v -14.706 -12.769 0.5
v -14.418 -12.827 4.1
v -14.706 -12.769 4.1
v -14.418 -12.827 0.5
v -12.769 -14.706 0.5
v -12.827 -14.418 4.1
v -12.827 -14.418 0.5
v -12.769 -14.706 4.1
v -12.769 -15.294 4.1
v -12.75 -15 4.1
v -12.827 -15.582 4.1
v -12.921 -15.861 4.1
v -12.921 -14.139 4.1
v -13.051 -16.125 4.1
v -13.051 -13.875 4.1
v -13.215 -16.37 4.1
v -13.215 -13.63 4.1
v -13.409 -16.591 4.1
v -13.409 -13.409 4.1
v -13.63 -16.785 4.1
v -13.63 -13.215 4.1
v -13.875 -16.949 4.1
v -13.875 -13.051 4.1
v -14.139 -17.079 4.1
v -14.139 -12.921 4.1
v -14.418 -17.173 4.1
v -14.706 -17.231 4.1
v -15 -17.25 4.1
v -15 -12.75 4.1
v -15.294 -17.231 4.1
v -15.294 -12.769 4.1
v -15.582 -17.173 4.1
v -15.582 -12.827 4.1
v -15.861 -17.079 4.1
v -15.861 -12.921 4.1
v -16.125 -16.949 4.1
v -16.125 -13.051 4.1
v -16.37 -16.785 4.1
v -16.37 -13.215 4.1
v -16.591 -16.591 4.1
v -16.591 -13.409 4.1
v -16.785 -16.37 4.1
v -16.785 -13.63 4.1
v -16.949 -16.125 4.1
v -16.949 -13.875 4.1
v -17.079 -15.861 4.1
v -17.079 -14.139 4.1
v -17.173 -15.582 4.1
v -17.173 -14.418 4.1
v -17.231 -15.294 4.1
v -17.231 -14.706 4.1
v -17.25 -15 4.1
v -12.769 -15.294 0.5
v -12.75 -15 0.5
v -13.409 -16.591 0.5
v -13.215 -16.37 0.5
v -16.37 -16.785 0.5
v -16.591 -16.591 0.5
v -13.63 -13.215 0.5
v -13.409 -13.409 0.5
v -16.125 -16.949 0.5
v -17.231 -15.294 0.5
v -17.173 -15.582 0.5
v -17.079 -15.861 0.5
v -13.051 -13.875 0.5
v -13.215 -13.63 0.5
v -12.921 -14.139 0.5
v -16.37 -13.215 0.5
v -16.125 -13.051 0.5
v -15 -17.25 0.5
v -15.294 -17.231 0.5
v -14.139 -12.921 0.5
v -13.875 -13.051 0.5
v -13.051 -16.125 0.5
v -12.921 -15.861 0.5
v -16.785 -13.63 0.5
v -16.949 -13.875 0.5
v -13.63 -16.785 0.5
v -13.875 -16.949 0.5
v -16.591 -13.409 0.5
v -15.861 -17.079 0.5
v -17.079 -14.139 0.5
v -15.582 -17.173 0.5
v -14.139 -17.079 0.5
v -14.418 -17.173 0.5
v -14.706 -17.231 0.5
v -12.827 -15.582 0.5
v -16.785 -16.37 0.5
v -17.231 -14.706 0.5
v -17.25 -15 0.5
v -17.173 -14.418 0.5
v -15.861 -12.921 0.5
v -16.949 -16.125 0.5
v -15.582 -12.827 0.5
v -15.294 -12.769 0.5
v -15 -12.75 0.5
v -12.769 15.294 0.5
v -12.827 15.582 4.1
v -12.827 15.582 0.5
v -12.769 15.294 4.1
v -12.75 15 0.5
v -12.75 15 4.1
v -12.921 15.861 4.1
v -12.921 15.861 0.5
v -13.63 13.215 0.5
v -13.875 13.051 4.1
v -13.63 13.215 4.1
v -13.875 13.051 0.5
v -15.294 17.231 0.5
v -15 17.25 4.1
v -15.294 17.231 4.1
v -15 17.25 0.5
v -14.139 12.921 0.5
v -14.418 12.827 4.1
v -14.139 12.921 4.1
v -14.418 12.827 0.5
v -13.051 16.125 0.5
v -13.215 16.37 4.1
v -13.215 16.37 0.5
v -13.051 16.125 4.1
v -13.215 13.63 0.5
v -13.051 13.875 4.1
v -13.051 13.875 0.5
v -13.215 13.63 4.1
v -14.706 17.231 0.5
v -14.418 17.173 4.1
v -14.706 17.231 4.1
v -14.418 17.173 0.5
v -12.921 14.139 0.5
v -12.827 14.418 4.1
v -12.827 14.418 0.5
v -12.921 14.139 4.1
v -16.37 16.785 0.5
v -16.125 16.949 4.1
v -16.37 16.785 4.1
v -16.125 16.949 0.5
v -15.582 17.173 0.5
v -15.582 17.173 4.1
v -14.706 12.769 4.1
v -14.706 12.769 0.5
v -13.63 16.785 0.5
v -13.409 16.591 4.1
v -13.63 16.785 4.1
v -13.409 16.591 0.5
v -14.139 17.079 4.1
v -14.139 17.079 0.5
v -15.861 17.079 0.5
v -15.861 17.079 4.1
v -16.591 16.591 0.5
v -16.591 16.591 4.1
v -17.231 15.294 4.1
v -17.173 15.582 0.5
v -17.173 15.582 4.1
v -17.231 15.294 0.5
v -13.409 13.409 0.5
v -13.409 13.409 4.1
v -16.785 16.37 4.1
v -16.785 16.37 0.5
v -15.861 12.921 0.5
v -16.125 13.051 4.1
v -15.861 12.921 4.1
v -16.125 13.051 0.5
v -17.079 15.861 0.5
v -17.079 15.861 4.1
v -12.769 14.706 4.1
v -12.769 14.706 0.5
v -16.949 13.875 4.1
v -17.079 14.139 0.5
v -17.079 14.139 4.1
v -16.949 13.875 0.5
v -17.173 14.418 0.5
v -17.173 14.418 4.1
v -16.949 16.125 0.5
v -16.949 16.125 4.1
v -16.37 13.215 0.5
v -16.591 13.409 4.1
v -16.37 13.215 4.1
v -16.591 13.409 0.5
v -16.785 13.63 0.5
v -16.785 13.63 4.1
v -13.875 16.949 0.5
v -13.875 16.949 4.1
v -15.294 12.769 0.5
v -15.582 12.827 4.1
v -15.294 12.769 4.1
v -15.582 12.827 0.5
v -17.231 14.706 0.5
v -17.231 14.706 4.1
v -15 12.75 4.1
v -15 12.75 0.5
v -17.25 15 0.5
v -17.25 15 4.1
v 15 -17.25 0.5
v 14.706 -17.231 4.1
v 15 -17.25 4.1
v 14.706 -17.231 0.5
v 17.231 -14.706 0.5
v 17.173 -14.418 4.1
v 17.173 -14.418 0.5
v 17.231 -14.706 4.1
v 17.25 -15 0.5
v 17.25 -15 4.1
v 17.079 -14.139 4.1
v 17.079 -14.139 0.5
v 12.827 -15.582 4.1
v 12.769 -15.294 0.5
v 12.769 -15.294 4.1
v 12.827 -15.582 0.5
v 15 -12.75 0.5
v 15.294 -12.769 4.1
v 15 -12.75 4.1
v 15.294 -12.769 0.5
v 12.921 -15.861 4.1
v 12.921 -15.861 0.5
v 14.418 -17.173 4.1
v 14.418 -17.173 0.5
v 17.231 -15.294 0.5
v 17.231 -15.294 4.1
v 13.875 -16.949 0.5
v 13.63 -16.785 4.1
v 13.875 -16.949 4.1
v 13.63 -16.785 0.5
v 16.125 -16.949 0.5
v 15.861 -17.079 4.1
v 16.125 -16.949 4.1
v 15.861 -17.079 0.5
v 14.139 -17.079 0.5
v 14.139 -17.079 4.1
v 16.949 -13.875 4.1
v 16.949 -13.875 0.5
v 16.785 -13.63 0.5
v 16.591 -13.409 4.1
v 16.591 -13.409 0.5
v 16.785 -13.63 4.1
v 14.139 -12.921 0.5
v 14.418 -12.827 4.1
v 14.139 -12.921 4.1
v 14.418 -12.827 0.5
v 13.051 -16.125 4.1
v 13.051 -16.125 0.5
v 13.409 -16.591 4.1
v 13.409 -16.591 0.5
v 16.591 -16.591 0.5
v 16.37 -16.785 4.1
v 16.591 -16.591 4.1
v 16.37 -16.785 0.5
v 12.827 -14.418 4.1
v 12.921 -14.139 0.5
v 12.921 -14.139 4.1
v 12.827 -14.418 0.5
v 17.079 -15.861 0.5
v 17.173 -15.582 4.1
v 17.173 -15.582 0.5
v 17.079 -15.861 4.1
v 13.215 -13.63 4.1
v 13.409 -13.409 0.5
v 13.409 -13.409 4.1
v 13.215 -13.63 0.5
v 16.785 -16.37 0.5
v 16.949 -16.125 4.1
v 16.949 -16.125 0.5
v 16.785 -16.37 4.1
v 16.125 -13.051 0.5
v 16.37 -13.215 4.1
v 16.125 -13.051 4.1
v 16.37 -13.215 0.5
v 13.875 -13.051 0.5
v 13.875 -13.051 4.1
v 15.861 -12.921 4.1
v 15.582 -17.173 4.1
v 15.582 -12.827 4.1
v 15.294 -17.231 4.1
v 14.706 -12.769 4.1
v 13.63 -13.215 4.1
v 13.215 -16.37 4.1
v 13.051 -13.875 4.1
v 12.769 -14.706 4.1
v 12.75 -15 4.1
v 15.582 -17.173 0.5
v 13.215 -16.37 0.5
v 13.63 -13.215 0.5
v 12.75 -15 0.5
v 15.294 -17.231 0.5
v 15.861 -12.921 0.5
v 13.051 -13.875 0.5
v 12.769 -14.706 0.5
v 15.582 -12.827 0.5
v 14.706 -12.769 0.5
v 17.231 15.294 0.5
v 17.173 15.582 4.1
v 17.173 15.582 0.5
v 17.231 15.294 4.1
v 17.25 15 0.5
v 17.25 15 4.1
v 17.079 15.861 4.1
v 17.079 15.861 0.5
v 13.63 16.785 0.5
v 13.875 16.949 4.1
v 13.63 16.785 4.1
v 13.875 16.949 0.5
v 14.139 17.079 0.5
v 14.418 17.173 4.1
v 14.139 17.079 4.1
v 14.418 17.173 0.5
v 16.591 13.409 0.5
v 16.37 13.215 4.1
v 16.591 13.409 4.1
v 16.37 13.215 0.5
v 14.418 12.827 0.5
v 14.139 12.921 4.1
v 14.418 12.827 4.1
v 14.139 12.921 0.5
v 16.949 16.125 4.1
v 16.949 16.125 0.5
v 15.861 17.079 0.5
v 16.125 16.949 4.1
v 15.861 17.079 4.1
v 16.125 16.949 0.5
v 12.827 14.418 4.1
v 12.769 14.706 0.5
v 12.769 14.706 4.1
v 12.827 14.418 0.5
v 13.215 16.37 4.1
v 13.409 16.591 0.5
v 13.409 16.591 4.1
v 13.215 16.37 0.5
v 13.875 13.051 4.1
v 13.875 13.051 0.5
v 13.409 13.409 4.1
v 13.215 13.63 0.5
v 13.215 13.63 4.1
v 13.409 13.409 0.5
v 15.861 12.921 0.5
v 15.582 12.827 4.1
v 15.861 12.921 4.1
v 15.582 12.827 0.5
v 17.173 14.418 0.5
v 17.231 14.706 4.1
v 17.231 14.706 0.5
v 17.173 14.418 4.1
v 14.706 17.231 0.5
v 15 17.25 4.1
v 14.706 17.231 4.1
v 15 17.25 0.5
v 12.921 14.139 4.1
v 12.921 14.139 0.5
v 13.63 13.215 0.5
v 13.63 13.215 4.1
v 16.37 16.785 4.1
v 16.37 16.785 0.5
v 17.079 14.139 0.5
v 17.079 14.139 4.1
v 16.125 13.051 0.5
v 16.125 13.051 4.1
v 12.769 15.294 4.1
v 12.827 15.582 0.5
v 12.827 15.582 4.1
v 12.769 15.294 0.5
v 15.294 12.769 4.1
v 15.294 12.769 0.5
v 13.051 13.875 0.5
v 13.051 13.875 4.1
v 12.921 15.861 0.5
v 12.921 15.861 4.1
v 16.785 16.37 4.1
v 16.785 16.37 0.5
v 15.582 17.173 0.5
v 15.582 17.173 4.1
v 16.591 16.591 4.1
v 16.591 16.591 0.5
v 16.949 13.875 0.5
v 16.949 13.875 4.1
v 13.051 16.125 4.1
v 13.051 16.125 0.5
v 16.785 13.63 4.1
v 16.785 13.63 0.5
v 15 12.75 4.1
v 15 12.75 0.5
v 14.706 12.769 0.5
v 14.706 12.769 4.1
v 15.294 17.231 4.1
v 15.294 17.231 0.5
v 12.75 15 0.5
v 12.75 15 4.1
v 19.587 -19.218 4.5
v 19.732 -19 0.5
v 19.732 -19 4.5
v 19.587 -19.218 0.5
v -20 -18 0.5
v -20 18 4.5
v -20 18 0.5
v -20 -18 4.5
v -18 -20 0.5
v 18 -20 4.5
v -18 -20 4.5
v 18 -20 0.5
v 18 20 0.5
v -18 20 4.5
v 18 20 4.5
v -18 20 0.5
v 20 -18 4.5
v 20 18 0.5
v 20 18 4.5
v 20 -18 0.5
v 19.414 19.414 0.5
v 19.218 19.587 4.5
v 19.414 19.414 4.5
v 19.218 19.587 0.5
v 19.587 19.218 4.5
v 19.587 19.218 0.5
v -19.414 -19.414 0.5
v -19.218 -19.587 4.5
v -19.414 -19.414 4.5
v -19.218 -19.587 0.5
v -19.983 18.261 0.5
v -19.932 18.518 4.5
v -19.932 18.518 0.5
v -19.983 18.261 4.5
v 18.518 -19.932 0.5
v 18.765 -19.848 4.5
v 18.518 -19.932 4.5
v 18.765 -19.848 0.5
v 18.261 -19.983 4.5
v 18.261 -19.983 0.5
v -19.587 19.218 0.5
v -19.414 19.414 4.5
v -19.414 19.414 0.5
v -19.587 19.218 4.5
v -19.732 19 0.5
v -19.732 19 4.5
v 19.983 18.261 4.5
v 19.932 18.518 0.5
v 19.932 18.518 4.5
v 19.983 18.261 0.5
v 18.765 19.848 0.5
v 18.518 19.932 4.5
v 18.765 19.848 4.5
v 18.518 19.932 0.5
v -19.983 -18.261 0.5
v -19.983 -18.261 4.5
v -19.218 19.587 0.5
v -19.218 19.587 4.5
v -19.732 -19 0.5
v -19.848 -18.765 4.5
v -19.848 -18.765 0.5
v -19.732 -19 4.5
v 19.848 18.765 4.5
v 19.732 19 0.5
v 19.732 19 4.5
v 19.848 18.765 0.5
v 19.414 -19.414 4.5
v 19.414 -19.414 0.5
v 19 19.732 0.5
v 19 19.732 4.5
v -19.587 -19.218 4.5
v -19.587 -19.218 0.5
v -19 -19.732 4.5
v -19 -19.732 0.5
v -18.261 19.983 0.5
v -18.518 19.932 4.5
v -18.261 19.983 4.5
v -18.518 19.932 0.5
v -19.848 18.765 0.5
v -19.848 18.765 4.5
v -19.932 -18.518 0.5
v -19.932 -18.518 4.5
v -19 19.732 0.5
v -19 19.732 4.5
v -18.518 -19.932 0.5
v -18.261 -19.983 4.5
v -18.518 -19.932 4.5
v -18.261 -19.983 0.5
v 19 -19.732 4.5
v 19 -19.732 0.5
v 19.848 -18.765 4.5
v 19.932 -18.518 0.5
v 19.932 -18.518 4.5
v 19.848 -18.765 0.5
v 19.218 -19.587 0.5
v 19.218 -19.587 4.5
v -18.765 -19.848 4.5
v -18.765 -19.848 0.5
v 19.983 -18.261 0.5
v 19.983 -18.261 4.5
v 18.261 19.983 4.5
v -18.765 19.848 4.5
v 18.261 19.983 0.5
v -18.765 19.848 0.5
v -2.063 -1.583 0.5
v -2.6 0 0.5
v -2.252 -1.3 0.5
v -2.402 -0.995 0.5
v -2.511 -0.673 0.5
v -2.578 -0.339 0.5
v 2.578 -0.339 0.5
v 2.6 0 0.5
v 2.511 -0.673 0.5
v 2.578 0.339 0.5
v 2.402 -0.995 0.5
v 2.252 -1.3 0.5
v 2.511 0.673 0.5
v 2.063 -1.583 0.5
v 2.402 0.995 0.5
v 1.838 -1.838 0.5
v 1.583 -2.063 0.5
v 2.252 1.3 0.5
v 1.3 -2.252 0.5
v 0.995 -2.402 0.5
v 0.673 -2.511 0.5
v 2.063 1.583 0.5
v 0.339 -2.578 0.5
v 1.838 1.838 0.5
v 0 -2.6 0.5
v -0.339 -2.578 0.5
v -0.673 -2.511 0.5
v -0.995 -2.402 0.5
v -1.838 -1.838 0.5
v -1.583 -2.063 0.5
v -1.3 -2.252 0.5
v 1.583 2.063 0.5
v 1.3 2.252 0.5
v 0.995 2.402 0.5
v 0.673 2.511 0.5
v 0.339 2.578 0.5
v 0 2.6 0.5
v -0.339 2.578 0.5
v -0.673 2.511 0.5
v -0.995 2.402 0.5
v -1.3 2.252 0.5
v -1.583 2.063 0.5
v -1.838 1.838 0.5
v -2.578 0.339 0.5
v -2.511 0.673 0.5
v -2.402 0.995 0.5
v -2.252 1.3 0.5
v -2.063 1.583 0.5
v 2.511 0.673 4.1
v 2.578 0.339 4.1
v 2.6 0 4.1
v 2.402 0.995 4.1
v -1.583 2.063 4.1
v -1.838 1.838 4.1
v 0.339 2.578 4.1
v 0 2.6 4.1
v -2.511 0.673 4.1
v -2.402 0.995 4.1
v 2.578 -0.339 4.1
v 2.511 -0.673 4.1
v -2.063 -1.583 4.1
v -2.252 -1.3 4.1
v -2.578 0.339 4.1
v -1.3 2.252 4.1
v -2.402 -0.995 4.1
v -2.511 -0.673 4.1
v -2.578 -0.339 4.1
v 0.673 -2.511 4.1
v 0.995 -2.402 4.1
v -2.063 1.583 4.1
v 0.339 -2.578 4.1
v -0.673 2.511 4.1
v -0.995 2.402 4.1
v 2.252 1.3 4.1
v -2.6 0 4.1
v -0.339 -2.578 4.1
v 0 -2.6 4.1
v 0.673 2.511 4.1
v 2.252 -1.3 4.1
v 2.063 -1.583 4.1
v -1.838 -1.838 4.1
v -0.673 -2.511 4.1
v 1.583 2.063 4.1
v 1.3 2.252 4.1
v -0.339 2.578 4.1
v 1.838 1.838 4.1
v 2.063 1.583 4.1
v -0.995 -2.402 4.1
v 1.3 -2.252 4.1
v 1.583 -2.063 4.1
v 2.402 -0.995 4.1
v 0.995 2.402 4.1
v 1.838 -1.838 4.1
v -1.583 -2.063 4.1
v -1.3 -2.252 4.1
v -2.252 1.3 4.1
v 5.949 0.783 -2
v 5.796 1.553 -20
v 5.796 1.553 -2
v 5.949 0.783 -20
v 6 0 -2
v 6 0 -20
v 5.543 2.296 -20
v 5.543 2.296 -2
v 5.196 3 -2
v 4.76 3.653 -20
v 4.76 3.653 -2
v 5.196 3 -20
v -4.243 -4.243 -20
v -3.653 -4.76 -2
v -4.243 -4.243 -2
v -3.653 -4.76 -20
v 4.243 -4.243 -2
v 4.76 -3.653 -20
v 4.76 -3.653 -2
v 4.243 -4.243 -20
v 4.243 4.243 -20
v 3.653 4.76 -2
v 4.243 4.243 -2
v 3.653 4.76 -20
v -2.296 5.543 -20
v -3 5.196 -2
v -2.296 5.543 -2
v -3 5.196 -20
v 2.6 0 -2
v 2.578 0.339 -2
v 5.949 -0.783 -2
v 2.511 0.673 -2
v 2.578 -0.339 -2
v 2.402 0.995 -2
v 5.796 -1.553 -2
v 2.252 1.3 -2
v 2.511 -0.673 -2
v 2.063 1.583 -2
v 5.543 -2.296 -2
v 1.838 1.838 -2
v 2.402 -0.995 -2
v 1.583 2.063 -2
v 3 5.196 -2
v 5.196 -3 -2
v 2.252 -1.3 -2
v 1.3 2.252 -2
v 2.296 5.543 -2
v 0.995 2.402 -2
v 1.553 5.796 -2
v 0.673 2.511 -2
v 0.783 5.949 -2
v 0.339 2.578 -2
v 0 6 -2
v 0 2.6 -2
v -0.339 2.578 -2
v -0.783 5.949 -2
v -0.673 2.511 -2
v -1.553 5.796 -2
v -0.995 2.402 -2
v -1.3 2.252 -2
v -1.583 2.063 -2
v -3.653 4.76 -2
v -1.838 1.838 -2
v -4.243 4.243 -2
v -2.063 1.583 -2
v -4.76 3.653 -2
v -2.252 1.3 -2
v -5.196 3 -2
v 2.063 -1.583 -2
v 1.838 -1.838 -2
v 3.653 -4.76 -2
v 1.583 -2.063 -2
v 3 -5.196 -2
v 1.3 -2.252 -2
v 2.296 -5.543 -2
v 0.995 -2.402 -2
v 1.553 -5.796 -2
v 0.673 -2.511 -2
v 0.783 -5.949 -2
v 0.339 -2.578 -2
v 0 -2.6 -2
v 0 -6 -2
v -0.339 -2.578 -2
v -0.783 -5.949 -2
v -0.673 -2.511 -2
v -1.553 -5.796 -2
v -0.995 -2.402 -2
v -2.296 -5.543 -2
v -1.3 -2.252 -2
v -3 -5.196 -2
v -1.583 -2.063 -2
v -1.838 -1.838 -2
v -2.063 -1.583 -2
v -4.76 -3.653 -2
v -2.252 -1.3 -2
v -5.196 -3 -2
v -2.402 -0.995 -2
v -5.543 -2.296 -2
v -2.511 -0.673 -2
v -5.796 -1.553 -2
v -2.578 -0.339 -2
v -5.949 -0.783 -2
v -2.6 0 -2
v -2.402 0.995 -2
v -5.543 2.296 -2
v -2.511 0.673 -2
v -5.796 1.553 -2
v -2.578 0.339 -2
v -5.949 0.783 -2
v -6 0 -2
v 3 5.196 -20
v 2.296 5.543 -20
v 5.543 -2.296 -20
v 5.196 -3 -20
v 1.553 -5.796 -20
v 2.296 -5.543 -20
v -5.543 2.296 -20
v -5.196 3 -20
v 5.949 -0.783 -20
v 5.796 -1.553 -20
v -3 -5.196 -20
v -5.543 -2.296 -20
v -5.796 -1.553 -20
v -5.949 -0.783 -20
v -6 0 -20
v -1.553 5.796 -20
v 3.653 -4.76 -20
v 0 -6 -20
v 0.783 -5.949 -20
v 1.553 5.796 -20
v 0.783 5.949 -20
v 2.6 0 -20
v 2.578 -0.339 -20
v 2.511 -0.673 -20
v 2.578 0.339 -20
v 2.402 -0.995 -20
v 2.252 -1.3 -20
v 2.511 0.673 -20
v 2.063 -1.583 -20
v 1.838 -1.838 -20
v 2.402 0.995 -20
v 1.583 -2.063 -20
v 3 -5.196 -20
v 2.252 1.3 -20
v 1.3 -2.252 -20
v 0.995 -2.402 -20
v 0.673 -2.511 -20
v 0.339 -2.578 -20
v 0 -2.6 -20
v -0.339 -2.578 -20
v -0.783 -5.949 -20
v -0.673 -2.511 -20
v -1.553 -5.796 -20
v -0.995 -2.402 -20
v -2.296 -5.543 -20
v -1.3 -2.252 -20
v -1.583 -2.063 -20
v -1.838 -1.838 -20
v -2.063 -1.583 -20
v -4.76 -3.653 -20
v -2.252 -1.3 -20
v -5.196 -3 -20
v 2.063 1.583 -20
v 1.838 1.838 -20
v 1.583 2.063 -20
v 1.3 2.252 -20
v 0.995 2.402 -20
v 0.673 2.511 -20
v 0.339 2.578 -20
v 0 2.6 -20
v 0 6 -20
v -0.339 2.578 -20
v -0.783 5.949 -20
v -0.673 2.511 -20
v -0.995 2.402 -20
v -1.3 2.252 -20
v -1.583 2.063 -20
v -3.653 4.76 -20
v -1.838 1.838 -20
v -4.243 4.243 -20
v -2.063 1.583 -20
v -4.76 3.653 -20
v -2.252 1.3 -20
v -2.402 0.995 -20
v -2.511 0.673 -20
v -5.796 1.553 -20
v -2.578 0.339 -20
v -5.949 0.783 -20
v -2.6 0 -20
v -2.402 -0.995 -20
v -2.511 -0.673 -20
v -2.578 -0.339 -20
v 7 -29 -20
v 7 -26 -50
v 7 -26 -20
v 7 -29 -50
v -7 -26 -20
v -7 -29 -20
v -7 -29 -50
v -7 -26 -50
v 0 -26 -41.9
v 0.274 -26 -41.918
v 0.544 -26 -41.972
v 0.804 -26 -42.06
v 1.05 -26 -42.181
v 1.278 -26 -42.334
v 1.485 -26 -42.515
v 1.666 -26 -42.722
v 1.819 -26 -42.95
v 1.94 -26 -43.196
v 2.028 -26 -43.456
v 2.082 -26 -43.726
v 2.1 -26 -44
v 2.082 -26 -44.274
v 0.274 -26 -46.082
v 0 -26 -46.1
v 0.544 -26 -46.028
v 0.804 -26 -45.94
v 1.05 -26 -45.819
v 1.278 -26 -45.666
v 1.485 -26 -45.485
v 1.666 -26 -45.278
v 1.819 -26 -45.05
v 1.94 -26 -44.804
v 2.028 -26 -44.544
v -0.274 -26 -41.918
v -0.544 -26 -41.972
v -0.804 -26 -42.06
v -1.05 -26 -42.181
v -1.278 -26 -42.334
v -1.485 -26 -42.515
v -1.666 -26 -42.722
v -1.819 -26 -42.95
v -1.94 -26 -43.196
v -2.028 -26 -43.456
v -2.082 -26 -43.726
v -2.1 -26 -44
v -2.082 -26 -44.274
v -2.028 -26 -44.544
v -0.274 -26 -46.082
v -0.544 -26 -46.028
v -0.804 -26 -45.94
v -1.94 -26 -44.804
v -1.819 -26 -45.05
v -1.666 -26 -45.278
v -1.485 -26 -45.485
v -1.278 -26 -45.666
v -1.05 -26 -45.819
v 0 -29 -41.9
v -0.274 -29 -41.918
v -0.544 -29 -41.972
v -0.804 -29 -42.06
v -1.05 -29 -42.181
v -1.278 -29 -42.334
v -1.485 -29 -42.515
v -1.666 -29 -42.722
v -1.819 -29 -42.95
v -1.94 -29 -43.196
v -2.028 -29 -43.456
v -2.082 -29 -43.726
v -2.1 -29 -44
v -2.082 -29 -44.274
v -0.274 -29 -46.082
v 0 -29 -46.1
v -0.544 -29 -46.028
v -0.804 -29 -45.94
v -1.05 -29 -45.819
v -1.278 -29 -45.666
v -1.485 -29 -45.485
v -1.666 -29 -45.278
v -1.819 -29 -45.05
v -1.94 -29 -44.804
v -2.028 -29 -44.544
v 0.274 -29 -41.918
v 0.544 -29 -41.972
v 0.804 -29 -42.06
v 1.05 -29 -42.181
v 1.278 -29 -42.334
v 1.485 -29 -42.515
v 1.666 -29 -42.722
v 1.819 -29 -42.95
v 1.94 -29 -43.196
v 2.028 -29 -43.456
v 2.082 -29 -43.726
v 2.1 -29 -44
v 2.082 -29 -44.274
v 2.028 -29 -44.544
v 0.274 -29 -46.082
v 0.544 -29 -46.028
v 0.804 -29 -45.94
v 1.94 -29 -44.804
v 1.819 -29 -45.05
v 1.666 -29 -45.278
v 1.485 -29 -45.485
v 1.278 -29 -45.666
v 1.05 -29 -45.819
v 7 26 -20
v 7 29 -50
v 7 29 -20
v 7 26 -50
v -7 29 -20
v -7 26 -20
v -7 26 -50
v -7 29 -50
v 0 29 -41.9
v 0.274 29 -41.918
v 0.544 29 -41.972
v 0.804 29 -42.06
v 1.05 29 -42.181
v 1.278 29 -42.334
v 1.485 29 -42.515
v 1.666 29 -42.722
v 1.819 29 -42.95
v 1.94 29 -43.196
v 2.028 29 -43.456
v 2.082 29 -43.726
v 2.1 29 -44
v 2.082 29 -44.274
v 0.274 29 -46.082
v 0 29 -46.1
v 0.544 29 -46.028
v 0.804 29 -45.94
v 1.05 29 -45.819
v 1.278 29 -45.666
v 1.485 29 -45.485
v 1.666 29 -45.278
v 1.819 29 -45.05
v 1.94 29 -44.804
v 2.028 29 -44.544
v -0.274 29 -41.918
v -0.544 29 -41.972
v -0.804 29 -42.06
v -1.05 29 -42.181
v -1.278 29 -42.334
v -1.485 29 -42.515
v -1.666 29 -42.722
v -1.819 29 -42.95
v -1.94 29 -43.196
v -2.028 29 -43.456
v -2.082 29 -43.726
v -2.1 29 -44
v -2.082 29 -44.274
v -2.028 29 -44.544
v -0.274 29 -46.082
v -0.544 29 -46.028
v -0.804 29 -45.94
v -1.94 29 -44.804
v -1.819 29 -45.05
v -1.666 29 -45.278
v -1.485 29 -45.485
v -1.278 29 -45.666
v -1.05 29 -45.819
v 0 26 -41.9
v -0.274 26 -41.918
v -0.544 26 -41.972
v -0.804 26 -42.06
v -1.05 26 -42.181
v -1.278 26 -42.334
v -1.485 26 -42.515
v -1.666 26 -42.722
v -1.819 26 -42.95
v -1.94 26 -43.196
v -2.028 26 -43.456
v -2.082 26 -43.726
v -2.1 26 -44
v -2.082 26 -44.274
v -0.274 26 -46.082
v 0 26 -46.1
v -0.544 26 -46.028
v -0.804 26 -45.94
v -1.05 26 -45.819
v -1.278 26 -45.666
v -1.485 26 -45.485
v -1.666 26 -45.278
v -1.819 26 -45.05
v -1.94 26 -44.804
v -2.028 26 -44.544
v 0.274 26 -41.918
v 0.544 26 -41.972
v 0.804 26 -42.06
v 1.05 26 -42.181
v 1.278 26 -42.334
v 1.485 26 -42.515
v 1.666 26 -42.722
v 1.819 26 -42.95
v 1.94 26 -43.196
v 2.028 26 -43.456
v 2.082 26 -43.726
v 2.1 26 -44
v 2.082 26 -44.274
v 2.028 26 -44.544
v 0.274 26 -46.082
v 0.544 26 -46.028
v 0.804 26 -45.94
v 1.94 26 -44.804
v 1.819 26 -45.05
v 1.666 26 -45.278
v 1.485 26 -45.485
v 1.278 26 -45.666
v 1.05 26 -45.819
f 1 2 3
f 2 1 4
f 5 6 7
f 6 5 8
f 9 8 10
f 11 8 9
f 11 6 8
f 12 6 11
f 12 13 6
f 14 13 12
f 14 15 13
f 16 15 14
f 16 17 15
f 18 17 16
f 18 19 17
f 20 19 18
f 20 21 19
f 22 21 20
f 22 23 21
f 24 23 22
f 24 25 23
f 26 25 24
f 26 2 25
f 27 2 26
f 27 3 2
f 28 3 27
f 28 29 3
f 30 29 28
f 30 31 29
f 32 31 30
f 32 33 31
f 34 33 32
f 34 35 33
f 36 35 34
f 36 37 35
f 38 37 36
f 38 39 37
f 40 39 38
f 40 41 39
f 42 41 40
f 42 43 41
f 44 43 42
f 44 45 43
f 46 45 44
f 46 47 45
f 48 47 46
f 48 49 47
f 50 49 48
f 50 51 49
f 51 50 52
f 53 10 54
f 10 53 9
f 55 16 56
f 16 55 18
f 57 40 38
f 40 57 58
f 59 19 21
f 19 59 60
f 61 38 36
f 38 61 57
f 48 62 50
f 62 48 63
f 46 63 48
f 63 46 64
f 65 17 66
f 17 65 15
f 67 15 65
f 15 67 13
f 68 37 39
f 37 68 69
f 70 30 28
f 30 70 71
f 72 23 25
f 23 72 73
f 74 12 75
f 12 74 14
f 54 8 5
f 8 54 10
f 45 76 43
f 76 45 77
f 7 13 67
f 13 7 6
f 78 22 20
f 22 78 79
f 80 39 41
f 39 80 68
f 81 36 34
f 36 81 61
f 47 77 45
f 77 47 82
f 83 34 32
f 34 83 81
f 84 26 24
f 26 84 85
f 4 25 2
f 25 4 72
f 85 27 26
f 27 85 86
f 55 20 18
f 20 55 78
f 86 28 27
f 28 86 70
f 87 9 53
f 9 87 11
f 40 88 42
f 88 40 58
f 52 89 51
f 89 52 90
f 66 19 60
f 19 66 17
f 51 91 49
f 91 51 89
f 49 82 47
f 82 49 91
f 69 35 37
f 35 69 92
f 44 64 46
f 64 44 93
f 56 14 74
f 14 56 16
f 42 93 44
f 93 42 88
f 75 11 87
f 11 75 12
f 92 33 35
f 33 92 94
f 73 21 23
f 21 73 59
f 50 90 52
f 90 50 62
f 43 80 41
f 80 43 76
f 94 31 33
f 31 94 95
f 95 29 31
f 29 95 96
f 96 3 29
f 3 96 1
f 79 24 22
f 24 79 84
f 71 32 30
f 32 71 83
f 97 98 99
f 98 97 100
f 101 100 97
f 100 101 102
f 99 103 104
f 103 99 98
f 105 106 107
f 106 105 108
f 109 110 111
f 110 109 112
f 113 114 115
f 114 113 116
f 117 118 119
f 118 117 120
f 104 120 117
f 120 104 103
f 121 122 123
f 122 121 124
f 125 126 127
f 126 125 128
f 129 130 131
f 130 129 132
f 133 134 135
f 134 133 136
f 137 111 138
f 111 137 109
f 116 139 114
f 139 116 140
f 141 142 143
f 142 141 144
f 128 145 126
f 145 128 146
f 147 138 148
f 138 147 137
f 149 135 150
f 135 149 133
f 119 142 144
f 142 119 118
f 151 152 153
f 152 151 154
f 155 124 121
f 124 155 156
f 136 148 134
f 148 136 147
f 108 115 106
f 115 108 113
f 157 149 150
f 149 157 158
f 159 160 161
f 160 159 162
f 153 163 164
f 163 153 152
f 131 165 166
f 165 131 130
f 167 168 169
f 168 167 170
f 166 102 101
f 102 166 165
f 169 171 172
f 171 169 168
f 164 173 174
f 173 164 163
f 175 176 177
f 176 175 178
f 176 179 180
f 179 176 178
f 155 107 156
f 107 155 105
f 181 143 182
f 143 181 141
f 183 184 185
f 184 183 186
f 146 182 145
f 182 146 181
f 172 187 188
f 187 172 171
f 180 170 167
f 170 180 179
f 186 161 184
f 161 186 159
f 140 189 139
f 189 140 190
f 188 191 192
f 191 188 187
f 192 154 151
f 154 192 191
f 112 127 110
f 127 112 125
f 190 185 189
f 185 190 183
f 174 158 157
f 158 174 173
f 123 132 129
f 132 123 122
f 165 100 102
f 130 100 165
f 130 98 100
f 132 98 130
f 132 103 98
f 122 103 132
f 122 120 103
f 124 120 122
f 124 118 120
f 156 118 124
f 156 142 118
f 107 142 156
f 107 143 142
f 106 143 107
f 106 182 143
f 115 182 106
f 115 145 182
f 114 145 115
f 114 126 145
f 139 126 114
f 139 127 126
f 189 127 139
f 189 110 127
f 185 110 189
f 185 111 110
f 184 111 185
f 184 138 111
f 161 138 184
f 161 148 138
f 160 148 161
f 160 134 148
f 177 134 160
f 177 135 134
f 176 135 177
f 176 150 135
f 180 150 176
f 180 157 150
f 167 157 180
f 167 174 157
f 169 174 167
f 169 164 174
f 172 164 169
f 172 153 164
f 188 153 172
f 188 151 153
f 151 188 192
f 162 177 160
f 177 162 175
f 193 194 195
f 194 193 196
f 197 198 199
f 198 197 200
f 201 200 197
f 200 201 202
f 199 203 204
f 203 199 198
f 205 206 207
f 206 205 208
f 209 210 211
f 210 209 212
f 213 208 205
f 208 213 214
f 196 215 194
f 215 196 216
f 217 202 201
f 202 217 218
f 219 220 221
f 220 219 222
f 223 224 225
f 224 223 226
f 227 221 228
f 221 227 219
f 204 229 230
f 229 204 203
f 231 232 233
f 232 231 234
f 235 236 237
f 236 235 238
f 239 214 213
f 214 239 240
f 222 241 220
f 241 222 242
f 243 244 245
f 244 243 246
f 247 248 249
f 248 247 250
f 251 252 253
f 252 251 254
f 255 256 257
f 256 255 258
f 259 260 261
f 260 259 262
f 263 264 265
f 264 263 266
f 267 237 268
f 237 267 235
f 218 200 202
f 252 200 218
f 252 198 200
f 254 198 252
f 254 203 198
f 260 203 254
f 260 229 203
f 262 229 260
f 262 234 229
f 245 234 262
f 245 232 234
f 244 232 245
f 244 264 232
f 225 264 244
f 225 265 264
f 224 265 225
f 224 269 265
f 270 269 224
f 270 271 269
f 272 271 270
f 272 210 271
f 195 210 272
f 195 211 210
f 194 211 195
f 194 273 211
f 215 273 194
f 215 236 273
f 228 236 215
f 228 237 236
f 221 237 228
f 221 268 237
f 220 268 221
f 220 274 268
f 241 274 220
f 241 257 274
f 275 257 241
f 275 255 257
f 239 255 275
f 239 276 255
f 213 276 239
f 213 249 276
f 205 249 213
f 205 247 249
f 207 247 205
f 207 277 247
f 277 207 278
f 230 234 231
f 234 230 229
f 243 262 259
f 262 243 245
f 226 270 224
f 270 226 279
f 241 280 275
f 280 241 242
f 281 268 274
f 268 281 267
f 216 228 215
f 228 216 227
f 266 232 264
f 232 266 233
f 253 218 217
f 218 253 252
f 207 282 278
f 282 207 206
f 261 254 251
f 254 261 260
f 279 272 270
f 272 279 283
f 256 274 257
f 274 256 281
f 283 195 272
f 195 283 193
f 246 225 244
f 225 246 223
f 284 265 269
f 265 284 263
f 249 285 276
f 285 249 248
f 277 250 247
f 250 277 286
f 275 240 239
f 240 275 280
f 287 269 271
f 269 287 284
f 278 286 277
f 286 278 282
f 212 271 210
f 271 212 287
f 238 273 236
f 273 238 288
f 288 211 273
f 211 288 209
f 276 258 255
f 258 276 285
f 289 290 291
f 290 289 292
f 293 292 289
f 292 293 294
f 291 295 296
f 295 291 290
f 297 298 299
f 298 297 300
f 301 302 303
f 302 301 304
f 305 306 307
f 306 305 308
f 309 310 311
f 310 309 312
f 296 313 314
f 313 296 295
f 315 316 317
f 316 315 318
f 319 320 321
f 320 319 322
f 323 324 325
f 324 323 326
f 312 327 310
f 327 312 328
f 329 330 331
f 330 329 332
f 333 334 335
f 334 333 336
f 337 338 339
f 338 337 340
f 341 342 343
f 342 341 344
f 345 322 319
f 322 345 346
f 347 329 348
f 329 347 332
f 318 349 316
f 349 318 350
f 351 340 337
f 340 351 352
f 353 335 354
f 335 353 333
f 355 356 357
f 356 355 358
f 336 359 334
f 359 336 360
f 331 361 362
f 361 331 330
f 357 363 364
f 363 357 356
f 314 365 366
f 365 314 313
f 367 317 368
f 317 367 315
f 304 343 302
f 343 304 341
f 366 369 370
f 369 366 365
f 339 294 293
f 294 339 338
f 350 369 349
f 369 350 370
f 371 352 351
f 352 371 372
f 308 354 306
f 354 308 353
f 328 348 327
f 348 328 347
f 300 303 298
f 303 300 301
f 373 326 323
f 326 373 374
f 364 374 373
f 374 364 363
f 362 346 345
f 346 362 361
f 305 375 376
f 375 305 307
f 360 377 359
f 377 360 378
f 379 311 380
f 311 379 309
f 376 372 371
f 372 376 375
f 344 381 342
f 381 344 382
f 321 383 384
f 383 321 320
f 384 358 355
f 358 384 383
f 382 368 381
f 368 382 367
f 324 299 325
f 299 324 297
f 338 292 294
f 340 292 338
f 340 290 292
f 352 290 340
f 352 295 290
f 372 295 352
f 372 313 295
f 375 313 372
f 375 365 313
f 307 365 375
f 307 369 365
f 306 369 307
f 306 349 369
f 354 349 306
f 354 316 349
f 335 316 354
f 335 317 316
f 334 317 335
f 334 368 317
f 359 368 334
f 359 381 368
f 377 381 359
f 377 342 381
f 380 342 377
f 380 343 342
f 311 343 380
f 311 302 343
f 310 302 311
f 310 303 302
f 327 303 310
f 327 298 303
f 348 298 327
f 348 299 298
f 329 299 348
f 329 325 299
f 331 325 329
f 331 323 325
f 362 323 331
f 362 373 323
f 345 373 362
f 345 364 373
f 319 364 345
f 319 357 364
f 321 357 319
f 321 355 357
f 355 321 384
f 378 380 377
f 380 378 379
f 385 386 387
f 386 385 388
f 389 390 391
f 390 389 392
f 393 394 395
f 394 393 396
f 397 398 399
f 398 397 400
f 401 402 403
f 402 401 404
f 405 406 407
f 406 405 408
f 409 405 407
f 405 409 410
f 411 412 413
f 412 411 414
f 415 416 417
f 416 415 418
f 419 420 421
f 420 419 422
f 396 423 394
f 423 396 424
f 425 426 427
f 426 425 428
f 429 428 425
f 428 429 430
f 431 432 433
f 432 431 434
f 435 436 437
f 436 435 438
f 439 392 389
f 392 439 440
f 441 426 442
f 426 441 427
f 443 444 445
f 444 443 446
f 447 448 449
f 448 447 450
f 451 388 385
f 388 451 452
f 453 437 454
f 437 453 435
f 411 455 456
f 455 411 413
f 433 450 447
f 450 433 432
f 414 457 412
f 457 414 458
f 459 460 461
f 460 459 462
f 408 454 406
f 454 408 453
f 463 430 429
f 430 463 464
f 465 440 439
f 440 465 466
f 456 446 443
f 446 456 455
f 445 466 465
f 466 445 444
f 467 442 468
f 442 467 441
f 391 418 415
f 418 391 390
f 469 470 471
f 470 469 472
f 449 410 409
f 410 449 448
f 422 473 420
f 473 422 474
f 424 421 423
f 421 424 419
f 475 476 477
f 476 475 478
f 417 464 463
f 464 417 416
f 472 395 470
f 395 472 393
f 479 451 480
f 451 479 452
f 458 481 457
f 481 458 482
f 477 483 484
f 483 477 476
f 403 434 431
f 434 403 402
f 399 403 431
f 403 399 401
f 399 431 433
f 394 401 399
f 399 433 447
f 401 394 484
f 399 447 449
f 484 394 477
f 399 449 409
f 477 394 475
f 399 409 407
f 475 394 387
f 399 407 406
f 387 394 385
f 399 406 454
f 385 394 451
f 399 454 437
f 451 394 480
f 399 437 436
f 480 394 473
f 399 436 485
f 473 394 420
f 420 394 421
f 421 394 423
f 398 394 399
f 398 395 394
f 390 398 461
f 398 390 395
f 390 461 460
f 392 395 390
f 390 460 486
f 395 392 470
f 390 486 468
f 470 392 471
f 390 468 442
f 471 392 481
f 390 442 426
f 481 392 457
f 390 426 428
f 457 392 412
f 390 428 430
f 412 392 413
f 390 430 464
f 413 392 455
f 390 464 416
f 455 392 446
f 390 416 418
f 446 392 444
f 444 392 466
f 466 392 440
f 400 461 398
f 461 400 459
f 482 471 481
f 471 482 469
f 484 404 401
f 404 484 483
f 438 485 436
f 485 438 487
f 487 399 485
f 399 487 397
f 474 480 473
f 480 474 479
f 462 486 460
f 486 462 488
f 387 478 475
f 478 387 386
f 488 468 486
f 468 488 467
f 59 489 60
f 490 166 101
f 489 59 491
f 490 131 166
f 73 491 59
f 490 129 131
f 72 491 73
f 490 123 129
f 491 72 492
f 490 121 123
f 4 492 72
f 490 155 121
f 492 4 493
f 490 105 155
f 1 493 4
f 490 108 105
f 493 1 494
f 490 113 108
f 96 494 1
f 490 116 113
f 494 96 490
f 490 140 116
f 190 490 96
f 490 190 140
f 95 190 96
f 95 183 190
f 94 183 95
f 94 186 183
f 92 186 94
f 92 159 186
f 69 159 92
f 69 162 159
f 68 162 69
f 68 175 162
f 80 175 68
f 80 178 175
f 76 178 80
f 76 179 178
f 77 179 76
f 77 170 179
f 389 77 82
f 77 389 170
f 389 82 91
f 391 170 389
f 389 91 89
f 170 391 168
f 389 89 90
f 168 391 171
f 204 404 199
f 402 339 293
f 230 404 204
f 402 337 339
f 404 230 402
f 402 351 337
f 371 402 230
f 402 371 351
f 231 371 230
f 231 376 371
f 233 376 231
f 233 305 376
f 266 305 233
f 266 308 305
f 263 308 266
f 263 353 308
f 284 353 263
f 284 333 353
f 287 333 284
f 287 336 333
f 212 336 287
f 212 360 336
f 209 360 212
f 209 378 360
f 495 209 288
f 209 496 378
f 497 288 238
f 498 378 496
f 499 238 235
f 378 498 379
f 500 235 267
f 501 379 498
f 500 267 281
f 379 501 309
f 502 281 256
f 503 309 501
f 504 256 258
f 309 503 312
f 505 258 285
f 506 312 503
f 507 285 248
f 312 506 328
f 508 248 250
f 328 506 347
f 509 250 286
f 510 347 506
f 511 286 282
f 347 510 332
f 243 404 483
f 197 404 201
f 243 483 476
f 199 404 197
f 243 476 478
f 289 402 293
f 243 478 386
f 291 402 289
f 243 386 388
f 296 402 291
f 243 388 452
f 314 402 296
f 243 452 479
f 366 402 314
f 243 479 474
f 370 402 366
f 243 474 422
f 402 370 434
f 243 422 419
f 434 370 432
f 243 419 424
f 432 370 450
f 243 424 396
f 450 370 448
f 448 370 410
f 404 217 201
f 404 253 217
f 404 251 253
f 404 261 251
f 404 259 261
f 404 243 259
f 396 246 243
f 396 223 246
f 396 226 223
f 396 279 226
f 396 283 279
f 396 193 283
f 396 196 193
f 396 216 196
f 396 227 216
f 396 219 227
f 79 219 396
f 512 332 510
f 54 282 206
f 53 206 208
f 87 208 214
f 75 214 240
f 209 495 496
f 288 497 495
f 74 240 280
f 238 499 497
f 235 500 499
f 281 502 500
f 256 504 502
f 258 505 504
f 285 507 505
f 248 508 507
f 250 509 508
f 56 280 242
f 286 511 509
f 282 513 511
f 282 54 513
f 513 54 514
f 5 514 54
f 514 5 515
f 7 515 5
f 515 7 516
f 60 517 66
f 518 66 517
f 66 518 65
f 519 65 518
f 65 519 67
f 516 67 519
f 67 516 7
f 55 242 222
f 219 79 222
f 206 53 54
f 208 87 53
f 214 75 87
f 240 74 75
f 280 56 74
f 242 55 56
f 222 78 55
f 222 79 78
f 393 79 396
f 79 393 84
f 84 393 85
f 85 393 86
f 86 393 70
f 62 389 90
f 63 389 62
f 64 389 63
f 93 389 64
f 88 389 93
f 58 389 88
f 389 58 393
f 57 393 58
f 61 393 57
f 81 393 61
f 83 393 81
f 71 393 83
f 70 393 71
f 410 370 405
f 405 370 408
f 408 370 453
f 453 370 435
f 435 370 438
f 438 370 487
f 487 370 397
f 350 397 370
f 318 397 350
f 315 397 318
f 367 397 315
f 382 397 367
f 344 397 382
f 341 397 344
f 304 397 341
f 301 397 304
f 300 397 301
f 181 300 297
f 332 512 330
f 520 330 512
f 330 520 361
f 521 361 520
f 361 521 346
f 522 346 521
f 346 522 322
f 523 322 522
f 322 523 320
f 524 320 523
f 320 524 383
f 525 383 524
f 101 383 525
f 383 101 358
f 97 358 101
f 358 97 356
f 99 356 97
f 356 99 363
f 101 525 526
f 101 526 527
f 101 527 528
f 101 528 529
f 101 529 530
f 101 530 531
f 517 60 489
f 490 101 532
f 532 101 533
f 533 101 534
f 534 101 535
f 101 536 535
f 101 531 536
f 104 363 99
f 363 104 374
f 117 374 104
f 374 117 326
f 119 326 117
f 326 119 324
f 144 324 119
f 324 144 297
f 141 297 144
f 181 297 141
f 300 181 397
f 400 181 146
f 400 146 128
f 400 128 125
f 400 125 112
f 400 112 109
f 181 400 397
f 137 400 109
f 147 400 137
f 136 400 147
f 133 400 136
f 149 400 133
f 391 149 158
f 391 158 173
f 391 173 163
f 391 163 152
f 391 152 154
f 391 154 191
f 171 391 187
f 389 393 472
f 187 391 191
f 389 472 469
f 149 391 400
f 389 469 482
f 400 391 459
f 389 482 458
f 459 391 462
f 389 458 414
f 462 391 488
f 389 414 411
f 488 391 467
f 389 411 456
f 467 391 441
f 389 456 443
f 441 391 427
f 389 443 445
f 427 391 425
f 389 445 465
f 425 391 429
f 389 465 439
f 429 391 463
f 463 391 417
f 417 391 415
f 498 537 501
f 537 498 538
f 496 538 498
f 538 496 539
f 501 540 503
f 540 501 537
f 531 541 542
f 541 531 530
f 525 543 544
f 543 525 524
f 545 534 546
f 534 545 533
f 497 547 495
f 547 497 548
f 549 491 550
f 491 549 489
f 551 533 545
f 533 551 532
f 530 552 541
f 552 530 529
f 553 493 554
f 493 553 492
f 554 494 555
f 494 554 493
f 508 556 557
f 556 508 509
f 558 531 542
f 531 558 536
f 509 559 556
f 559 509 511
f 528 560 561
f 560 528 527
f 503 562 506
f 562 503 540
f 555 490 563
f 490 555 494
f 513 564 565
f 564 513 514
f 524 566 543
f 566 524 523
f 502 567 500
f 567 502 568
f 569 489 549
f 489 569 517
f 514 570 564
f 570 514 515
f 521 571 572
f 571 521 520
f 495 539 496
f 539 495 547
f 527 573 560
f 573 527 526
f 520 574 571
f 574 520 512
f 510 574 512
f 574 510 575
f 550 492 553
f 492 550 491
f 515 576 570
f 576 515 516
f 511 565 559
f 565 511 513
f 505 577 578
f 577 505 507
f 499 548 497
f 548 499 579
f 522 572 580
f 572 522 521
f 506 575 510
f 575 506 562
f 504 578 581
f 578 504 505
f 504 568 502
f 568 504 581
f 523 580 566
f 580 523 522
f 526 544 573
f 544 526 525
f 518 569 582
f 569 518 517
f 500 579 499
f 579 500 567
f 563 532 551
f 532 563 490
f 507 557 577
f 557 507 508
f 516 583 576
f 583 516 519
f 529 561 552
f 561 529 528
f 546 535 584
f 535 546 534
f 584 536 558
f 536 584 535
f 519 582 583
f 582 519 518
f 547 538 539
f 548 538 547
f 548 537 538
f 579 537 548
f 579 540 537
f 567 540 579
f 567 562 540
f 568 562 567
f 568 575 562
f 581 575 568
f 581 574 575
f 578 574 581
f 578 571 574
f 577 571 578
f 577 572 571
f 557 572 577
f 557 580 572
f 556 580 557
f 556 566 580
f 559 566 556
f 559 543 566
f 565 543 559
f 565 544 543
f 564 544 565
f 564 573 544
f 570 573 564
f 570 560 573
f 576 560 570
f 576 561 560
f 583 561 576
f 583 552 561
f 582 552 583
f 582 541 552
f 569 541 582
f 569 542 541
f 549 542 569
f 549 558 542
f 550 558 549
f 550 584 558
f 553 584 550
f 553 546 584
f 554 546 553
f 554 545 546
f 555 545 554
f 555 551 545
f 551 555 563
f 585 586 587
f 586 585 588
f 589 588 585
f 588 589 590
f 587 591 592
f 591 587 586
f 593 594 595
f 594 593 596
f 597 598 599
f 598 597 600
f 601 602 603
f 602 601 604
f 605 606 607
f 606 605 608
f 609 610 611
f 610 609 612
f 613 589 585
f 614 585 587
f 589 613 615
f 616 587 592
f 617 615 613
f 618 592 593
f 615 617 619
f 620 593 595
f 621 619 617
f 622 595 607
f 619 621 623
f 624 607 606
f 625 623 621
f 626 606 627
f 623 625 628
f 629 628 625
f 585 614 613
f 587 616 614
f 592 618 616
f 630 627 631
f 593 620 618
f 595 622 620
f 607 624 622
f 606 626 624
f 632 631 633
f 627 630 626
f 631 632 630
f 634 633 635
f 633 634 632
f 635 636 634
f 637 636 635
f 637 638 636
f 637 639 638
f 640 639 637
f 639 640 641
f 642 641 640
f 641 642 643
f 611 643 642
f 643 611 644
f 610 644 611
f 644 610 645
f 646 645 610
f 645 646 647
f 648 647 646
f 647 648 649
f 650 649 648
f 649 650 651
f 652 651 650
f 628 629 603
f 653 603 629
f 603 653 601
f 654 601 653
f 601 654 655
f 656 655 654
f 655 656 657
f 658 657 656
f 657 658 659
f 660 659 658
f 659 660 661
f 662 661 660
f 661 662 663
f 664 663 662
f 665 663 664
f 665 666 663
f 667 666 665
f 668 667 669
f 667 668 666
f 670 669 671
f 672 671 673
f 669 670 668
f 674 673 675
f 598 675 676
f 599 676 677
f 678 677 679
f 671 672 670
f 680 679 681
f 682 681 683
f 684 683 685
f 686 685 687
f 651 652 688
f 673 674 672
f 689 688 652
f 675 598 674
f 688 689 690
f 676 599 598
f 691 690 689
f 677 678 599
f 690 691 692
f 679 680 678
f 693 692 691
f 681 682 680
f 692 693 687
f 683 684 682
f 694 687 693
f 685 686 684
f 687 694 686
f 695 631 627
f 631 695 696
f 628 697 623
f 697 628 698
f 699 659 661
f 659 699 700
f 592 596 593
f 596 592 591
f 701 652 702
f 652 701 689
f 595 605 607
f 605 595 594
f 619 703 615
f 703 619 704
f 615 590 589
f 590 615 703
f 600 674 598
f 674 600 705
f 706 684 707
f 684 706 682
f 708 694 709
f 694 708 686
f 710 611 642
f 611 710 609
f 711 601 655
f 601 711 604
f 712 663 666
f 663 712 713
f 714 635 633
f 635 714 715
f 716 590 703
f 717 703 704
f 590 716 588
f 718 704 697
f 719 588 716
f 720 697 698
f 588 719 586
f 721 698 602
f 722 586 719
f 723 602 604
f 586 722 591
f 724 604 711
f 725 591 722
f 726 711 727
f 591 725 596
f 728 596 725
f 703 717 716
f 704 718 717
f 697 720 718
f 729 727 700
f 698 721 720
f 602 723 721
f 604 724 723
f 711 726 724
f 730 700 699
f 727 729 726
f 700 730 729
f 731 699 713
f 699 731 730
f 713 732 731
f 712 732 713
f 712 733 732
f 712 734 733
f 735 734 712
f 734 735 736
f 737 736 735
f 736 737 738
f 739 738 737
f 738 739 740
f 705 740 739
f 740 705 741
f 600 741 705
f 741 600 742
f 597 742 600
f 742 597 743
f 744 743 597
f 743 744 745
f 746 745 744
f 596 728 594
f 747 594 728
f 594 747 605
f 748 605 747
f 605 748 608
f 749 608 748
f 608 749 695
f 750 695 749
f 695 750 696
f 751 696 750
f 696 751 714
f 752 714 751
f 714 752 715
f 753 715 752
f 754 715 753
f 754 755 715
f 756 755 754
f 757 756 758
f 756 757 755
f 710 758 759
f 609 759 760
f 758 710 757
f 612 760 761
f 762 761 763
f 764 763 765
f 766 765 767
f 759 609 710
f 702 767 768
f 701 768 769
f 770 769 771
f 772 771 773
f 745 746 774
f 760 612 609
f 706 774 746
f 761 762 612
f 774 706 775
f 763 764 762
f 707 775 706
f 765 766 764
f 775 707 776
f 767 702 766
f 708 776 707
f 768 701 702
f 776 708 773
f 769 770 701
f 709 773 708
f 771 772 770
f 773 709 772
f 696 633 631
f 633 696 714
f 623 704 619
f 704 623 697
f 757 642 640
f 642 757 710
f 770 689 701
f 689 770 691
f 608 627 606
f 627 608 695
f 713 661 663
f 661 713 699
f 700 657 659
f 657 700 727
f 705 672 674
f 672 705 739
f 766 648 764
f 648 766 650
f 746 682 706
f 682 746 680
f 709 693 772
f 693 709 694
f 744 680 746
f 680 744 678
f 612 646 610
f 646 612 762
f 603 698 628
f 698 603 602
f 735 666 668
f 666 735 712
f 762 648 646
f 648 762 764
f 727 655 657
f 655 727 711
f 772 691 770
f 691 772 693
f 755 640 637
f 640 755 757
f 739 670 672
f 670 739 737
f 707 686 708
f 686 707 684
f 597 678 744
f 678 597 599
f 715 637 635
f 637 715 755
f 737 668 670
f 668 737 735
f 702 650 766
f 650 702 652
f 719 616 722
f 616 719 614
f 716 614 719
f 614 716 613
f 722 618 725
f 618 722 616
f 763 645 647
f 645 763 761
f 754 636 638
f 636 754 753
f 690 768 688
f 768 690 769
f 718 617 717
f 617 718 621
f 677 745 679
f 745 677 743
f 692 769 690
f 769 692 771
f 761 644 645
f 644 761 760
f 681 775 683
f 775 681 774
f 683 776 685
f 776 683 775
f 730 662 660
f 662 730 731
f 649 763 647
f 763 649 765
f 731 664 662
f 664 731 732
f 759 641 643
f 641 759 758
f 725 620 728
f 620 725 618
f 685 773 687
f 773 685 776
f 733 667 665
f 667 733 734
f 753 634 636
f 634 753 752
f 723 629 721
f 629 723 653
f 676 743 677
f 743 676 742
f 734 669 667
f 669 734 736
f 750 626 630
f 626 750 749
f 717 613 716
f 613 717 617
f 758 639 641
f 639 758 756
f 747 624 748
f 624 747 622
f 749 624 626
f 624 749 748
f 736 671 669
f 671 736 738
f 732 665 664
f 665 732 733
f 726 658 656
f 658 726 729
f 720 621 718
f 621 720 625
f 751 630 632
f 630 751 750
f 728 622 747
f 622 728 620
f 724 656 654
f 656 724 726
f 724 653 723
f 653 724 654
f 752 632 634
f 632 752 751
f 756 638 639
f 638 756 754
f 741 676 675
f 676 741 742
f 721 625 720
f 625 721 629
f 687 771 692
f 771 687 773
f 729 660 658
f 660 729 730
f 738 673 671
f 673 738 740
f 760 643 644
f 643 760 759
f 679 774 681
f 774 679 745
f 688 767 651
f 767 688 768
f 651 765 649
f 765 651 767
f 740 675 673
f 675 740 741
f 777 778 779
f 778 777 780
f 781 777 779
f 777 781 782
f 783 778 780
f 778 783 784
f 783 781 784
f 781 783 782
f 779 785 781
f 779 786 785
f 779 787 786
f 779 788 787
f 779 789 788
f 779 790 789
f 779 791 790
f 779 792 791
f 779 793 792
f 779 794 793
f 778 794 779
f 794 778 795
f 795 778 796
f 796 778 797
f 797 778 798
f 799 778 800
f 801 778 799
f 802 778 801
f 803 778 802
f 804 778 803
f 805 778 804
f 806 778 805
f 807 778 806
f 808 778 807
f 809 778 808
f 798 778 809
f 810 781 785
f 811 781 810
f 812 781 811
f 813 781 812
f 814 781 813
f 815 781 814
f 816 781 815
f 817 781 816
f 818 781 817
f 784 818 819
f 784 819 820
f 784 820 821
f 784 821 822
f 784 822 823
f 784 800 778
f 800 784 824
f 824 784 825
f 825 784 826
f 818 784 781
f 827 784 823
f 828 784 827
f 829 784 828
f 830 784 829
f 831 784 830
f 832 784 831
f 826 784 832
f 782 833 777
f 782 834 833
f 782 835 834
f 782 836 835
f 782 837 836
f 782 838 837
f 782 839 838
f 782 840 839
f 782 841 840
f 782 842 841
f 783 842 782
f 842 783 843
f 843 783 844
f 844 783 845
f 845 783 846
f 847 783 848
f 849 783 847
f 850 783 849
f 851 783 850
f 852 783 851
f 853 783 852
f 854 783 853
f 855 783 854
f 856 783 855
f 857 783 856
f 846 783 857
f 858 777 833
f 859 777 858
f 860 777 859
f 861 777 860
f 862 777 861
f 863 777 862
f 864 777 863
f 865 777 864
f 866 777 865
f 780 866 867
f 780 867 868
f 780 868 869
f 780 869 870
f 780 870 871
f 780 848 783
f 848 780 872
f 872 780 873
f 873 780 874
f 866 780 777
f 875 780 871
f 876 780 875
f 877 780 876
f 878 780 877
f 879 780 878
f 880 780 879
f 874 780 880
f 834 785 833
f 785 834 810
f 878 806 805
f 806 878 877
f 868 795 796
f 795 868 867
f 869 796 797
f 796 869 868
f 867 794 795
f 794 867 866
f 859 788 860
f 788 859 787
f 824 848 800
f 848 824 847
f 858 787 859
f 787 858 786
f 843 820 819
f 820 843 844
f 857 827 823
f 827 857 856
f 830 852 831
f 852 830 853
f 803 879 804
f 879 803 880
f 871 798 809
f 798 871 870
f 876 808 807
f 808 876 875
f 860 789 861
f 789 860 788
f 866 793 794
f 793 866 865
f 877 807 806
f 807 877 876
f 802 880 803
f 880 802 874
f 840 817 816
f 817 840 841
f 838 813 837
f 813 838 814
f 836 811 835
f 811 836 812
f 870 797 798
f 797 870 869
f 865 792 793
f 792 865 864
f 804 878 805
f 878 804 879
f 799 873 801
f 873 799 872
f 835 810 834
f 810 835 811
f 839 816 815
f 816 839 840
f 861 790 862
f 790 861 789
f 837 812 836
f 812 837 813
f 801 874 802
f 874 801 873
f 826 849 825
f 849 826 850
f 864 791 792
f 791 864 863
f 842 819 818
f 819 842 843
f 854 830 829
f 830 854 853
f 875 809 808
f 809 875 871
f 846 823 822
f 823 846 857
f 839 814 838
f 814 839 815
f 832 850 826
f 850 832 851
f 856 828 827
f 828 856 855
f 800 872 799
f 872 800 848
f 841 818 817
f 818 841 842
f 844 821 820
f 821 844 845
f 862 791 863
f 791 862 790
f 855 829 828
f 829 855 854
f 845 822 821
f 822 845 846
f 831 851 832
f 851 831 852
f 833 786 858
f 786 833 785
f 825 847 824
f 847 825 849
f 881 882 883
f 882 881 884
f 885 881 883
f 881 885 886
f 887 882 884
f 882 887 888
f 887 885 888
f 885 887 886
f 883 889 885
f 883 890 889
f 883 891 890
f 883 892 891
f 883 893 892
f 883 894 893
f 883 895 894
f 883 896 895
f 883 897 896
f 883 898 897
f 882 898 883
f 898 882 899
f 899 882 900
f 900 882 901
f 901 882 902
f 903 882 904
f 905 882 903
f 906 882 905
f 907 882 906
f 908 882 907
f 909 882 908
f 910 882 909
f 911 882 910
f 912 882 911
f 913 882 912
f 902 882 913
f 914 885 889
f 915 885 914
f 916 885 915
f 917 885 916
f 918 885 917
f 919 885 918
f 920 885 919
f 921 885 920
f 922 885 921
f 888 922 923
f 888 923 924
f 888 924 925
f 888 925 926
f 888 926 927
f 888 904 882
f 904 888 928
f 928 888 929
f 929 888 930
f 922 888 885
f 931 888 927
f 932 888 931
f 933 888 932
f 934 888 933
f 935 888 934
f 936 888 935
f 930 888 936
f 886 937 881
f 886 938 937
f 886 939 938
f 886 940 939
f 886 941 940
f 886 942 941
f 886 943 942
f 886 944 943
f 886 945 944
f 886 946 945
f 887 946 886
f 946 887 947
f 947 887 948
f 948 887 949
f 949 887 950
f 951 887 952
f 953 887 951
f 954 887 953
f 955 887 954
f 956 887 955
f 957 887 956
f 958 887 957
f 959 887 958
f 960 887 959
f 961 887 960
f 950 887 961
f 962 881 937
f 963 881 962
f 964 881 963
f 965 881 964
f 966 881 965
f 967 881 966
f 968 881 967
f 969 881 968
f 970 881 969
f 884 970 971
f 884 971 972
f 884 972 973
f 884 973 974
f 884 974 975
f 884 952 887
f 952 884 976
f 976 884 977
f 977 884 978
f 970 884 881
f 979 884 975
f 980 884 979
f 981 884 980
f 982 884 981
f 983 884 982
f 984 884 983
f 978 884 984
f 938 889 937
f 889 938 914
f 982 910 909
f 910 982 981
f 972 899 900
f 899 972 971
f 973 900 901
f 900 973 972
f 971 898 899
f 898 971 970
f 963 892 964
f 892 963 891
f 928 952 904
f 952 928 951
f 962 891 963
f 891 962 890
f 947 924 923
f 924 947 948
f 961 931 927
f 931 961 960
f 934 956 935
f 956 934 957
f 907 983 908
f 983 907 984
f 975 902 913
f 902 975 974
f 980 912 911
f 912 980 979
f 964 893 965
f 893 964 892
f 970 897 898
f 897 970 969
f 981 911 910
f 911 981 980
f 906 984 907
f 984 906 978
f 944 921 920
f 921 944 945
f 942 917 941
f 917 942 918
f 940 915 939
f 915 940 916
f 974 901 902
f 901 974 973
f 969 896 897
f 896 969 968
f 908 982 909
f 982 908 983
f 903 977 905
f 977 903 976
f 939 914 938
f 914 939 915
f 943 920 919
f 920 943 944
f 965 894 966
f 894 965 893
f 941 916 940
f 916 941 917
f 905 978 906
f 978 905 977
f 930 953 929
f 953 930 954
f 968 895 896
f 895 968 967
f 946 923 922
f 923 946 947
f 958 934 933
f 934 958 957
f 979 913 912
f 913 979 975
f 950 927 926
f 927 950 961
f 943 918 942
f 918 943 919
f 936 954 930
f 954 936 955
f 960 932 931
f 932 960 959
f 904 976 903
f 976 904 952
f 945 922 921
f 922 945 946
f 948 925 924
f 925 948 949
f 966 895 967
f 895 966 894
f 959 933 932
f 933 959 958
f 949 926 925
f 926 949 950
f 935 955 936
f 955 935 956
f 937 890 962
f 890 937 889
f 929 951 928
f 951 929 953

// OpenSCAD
// ============================================================
// Caster Wheel Bracket — 50 mm swivel caster for robot base
// ============================================================
// Bolts to the underside of the base deck.
// Accepts a standard 50 mm swivel caster ball-wheel insert.
// Swivel axle: 5 mm diameter bolt through bracket pivot.
// ============================================================

deck_w      = 40;   // mm — bracket footprint width
deck_l      = 40;   // mm — bracket footprint depth
deck_h      =  4;   // mm — mounting plate thickness
bolt_d      =  4.5; // mm — M4 clearance for deck bolts
bolt_sep_x  = 30;   // mm — bolt pattern X spacing
bolt_sep_y  = 30;   // mm — bolt pattern Y spacing

swivel_h    = 18;   // mm — height of swivel post from plate
swivel_od   = 12;   // mm — swivel post outer diameter
axle_d      =  5.2; // mm — axle bolt clearance
caster_d    = 50;   // mm — caster wheel diameter (reference)
fork_w      = 14;   // mm — fork width (wheel gap + 2 mm each side)
fork_h      = 30;   // mm — fork arm length
fork_t      =  3;   // mm — fork wall thickness
wheel_axle_d =  4.2;// mm — wheel axle bolt

corner_r    = 2.0;
wall        = 3.0;
$fn = 48;

// ============================================================
module mounting_plate() {
    difference() {
        // Rounded plate
        minkowski() {
            cube([deck_w - 2*corner_r,
                  deck_l - 2*corner_r,
                  deck_h - corner_r/2], center = true);
            cylinder(r = corner_r, h = corner_r/2);
        }
        // Bolt holes
        for (dx = [-bolt_sep_x/2, bolt_sep_x/2])
            for (dy = [-bolt_sep_y/2, bolt_sep_y/2])
                translate([dx, dy, -deck_h/2 - 0.1])
                    cylinder(r = bolt_d/2, h = deck_h + 0.2);
        // Swivel axle hole (centre)
        translate([0, 0, -deck_h/2 - 0.1])
            cylinder(r = axle_d/2, h = deck_h + 0.2);
    }
}

module swivel_post() {
    // Cylindrical post below the plate that allows rotation
    translate([0, 0, -deck_h/2 - swivel_h])
        difference() {
            cylinder(r = swivel_od/2, h = swivel_h);
            translate([0, 0, -0.1])
                cylinder(r = axle_d/2, h = swivel_h + 0.2);
        }
}

module fork_arm() {
    // Two parallel arms forming a U-fork around the caster wheel
    difference() {
        translate([-fork_w/2, -fork_t/2, -deck_h/2 - swivel_h - fork_h])
            cube([fork_w, fork_t, fork_h]);
        // Wheel axle hole
        translate([0, 0, -deck_h/2 - swivel_h - fork_h + 6])
            rotate([90, 0, 0])
                cylinder(r = wheel_axle_d/2, h = fork_t + 1, center = true);
    }
}

// ============================================================
union() {
    color("LightSlateGray") translate([0, 0, deck_h/2]) mounting_plate();
    color("SlateGray")      swivel_post();
    // Fork arms (front & back of wheel)
    for (dy = [-caster_d/2 - fork_t/2 - 1, caster_d/2 + fork_t/2 + 1])
        color("DimGray")
            translate([0, dy, 0])
                fork_arm();
}
